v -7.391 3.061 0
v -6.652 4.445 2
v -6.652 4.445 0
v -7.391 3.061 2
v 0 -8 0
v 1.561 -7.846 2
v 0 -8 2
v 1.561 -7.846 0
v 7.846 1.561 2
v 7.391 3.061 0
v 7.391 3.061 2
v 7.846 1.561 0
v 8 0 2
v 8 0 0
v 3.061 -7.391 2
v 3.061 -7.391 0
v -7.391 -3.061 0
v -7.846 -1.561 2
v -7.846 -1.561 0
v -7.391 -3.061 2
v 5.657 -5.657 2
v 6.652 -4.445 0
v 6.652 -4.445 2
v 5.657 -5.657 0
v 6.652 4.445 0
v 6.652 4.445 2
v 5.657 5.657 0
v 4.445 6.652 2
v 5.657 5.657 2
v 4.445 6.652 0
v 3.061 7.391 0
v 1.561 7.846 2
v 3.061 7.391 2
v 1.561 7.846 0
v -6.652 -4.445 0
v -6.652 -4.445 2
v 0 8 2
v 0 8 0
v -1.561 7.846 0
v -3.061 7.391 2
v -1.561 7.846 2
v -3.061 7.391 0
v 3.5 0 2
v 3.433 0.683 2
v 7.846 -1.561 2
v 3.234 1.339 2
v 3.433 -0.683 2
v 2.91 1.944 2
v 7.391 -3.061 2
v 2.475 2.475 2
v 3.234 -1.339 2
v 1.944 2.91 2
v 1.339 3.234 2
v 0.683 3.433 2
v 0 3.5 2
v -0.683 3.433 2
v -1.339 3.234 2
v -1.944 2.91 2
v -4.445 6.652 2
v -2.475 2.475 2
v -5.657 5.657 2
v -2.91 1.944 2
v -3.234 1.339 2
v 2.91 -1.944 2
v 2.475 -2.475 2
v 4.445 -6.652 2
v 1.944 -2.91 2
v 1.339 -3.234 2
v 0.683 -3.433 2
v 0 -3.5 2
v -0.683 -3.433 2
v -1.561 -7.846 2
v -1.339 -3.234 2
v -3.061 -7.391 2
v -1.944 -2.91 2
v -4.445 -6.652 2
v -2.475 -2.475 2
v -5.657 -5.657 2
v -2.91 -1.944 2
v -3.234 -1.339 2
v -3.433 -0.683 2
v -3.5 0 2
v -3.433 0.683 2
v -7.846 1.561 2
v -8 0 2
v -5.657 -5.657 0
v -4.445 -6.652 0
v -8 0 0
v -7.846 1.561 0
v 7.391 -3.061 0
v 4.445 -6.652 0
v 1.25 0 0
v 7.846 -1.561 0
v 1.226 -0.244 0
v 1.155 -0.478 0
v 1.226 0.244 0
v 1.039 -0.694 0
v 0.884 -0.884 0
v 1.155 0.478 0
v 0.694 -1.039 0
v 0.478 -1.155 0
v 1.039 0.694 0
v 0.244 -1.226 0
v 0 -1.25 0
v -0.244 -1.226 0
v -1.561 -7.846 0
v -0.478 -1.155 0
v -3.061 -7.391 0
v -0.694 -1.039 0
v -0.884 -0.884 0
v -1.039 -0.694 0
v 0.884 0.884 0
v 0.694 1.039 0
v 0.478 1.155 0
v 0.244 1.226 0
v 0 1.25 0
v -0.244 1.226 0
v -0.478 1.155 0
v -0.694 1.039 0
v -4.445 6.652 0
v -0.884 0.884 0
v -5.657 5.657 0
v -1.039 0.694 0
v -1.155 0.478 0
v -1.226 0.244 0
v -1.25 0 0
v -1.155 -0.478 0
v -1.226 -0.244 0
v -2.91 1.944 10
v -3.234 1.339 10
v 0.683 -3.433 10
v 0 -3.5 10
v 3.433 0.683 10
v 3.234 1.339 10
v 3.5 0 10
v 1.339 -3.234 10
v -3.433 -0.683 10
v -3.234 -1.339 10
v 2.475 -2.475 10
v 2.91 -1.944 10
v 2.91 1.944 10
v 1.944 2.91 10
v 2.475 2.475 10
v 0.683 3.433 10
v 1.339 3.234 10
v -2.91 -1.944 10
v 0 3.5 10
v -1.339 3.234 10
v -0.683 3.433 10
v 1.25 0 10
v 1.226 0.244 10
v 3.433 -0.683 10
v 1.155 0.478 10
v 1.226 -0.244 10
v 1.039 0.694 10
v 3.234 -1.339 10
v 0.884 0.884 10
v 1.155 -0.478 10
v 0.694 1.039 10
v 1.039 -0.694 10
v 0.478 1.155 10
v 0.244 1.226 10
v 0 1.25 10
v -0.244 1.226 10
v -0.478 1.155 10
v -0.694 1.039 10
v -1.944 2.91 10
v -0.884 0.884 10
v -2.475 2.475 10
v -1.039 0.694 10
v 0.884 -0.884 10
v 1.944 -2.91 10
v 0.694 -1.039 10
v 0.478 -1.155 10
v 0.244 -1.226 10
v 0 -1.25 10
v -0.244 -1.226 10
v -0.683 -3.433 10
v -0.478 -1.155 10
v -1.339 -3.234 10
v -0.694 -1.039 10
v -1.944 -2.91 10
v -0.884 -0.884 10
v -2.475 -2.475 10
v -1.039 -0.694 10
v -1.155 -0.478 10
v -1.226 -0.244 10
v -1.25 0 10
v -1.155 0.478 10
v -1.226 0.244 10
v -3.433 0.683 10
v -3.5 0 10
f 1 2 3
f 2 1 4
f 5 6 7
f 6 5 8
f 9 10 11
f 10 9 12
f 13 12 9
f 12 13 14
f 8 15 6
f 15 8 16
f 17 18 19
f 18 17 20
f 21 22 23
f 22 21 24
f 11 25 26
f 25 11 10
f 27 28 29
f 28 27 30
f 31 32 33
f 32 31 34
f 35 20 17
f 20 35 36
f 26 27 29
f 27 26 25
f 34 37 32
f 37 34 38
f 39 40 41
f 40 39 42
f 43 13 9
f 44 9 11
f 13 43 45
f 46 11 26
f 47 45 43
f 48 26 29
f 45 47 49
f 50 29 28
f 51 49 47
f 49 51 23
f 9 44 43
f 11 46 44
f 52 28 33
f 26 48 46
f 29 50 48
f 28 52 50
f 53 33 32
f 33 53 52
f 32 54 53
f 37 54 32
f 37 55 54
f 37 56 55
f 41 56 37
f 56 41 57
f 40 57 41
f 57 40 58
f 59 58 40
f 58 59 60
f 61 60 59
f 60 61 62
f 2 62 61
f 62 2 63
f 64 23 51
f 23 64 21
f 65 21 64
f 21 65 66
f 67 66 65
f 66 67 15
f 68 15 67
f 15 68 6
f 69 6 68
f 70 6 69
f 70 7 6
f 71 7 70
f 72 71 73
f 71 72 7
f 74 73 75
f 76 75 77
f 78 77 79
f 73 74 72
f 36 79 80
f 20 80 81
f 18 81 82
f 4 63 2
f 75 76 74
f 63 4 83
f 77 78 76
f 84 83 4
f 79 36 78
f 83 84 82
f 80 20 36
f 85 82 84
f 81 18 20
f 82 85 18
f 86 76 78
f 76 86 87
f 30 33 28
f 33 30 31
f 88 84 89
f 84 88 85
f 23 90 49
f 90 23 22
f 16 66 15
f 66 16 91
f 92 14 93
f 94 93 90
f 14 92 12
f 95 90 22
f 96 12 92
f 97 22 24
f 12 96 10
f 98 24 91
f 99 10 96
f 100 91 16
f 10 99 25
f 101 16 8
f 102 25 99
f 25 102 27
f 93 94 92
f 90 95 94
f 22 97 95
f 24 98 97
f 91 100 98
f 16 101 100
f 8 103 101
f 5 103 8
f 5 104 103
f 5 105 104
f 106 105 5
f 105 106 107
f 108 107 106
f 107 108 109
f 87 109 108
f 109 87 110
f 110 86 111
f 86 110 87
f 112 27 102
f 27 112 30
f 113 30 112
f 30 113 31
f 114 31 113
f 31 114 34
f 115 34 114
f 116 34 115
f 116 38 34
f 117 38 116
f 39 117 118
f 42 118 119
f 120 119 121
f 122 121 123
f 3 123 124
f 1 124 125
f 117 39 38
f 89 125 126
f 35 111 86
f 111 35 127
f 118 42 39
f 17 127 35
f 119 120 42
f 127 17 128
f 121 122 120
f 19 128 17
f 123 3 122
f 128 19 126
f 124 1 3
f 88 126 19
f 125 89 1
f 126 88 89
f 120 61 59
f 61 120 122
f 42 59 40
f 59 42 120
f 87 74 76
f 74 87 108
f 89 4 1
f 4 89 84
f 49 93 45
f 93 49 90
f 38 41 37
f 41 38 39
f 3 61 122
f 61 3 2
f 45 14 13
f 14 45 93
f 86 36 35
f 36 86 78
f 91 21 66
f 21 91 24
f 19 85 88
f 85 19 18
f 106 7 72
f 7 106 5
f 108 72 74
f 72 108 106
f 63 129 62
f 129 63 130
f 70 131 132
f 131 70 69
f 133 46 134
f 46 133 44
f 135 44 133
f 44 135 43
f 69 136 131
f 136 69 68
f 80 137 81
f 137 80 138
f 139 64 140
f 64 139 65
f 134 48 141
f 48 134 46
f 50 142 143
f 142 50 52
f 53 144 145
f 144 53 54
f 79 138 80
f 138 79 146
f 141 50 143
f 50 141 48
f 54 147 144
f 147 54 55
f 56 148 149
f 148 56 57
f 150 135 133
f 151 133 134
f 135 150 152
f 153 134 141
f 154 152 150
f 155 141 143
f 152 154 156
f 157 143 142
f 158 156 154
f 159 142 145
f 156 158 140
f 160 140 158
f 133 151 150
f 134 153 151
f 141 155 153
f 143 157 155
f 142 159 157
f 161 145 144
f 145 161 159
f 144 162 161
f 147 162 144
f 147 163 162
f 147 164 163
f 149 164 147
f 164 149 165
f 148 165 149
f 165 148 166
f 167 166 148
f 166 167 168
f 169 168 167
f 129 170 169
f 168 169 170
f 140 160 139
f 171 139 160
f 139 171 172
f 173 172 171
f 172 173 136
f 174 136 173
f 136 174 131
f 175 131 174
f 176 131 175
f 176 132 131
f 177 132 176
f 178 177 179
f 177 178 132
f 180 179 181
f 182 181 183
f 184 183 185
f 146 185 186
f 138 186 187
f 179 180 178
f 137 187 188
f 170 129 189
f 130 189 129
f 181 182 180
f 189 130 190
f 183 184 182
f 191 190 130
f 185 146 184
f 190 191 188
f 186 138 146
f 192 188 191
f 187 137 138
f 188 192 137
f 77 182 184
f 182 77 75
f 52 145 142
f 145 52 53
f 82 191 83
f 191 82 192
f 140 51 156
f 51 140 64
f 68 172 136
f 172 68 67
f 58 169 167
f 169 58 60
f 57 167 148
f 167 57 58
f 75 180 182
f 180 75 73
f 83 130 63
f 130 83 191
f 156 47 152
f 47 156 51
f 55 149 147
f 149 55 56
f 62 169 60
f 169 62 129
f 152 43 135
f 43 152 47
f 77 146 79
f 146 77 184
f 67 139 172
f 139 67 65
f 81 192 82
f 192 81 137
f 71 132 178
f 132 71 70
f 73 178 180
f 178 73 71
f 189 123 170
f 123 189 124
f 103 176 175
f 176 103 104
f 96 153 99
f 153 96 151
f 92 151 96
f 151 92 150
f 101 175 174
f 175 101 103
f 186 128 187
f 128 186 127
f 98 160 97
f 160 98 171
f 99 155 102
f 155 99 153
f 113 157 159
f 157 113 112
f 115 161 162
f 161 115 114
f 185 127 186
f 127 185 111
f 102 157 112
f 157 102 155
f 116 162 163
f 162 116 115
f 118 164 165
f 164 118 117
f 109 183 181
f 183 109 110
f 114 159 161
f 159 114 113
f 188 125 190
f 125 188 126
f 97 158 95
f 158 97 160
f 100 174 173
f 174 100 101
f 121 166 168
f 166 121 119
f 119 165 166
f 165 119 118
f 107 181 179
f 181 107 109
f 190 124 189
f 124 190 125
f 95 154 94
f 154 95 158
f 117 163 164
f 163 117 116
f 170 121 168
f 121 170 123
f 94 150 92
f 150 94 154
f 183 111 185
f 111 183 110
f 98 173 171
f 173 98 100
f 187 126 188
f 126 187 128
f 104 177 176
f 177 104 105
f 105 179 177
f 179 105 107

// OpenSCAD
$fn = 32;

// ----------------------------------------------------------------------
// Micro post: flanged post, 5-20 mm class
// ----------------------------------------------------------------------

// --- parameters (mm) ---
post_d = 7;               // post diameter
post_h = 8;               // post height above the flange
flange_d = 16;            // flange diameter
flange_t = 2;             // flange thickness
bore_d = 2.5;             // through bore

total_h = post_h + flange_t;  // overall height

difference() {
  union() {
    cylinder(h = flange_t, d = flange_d);
    translate([0, 0, flange_t]) cylinder(h = post_h, d = post_d);
  }
  translate([0, 0, -1]) cylinder(h = total_h + 2, d = bore_d);
}
